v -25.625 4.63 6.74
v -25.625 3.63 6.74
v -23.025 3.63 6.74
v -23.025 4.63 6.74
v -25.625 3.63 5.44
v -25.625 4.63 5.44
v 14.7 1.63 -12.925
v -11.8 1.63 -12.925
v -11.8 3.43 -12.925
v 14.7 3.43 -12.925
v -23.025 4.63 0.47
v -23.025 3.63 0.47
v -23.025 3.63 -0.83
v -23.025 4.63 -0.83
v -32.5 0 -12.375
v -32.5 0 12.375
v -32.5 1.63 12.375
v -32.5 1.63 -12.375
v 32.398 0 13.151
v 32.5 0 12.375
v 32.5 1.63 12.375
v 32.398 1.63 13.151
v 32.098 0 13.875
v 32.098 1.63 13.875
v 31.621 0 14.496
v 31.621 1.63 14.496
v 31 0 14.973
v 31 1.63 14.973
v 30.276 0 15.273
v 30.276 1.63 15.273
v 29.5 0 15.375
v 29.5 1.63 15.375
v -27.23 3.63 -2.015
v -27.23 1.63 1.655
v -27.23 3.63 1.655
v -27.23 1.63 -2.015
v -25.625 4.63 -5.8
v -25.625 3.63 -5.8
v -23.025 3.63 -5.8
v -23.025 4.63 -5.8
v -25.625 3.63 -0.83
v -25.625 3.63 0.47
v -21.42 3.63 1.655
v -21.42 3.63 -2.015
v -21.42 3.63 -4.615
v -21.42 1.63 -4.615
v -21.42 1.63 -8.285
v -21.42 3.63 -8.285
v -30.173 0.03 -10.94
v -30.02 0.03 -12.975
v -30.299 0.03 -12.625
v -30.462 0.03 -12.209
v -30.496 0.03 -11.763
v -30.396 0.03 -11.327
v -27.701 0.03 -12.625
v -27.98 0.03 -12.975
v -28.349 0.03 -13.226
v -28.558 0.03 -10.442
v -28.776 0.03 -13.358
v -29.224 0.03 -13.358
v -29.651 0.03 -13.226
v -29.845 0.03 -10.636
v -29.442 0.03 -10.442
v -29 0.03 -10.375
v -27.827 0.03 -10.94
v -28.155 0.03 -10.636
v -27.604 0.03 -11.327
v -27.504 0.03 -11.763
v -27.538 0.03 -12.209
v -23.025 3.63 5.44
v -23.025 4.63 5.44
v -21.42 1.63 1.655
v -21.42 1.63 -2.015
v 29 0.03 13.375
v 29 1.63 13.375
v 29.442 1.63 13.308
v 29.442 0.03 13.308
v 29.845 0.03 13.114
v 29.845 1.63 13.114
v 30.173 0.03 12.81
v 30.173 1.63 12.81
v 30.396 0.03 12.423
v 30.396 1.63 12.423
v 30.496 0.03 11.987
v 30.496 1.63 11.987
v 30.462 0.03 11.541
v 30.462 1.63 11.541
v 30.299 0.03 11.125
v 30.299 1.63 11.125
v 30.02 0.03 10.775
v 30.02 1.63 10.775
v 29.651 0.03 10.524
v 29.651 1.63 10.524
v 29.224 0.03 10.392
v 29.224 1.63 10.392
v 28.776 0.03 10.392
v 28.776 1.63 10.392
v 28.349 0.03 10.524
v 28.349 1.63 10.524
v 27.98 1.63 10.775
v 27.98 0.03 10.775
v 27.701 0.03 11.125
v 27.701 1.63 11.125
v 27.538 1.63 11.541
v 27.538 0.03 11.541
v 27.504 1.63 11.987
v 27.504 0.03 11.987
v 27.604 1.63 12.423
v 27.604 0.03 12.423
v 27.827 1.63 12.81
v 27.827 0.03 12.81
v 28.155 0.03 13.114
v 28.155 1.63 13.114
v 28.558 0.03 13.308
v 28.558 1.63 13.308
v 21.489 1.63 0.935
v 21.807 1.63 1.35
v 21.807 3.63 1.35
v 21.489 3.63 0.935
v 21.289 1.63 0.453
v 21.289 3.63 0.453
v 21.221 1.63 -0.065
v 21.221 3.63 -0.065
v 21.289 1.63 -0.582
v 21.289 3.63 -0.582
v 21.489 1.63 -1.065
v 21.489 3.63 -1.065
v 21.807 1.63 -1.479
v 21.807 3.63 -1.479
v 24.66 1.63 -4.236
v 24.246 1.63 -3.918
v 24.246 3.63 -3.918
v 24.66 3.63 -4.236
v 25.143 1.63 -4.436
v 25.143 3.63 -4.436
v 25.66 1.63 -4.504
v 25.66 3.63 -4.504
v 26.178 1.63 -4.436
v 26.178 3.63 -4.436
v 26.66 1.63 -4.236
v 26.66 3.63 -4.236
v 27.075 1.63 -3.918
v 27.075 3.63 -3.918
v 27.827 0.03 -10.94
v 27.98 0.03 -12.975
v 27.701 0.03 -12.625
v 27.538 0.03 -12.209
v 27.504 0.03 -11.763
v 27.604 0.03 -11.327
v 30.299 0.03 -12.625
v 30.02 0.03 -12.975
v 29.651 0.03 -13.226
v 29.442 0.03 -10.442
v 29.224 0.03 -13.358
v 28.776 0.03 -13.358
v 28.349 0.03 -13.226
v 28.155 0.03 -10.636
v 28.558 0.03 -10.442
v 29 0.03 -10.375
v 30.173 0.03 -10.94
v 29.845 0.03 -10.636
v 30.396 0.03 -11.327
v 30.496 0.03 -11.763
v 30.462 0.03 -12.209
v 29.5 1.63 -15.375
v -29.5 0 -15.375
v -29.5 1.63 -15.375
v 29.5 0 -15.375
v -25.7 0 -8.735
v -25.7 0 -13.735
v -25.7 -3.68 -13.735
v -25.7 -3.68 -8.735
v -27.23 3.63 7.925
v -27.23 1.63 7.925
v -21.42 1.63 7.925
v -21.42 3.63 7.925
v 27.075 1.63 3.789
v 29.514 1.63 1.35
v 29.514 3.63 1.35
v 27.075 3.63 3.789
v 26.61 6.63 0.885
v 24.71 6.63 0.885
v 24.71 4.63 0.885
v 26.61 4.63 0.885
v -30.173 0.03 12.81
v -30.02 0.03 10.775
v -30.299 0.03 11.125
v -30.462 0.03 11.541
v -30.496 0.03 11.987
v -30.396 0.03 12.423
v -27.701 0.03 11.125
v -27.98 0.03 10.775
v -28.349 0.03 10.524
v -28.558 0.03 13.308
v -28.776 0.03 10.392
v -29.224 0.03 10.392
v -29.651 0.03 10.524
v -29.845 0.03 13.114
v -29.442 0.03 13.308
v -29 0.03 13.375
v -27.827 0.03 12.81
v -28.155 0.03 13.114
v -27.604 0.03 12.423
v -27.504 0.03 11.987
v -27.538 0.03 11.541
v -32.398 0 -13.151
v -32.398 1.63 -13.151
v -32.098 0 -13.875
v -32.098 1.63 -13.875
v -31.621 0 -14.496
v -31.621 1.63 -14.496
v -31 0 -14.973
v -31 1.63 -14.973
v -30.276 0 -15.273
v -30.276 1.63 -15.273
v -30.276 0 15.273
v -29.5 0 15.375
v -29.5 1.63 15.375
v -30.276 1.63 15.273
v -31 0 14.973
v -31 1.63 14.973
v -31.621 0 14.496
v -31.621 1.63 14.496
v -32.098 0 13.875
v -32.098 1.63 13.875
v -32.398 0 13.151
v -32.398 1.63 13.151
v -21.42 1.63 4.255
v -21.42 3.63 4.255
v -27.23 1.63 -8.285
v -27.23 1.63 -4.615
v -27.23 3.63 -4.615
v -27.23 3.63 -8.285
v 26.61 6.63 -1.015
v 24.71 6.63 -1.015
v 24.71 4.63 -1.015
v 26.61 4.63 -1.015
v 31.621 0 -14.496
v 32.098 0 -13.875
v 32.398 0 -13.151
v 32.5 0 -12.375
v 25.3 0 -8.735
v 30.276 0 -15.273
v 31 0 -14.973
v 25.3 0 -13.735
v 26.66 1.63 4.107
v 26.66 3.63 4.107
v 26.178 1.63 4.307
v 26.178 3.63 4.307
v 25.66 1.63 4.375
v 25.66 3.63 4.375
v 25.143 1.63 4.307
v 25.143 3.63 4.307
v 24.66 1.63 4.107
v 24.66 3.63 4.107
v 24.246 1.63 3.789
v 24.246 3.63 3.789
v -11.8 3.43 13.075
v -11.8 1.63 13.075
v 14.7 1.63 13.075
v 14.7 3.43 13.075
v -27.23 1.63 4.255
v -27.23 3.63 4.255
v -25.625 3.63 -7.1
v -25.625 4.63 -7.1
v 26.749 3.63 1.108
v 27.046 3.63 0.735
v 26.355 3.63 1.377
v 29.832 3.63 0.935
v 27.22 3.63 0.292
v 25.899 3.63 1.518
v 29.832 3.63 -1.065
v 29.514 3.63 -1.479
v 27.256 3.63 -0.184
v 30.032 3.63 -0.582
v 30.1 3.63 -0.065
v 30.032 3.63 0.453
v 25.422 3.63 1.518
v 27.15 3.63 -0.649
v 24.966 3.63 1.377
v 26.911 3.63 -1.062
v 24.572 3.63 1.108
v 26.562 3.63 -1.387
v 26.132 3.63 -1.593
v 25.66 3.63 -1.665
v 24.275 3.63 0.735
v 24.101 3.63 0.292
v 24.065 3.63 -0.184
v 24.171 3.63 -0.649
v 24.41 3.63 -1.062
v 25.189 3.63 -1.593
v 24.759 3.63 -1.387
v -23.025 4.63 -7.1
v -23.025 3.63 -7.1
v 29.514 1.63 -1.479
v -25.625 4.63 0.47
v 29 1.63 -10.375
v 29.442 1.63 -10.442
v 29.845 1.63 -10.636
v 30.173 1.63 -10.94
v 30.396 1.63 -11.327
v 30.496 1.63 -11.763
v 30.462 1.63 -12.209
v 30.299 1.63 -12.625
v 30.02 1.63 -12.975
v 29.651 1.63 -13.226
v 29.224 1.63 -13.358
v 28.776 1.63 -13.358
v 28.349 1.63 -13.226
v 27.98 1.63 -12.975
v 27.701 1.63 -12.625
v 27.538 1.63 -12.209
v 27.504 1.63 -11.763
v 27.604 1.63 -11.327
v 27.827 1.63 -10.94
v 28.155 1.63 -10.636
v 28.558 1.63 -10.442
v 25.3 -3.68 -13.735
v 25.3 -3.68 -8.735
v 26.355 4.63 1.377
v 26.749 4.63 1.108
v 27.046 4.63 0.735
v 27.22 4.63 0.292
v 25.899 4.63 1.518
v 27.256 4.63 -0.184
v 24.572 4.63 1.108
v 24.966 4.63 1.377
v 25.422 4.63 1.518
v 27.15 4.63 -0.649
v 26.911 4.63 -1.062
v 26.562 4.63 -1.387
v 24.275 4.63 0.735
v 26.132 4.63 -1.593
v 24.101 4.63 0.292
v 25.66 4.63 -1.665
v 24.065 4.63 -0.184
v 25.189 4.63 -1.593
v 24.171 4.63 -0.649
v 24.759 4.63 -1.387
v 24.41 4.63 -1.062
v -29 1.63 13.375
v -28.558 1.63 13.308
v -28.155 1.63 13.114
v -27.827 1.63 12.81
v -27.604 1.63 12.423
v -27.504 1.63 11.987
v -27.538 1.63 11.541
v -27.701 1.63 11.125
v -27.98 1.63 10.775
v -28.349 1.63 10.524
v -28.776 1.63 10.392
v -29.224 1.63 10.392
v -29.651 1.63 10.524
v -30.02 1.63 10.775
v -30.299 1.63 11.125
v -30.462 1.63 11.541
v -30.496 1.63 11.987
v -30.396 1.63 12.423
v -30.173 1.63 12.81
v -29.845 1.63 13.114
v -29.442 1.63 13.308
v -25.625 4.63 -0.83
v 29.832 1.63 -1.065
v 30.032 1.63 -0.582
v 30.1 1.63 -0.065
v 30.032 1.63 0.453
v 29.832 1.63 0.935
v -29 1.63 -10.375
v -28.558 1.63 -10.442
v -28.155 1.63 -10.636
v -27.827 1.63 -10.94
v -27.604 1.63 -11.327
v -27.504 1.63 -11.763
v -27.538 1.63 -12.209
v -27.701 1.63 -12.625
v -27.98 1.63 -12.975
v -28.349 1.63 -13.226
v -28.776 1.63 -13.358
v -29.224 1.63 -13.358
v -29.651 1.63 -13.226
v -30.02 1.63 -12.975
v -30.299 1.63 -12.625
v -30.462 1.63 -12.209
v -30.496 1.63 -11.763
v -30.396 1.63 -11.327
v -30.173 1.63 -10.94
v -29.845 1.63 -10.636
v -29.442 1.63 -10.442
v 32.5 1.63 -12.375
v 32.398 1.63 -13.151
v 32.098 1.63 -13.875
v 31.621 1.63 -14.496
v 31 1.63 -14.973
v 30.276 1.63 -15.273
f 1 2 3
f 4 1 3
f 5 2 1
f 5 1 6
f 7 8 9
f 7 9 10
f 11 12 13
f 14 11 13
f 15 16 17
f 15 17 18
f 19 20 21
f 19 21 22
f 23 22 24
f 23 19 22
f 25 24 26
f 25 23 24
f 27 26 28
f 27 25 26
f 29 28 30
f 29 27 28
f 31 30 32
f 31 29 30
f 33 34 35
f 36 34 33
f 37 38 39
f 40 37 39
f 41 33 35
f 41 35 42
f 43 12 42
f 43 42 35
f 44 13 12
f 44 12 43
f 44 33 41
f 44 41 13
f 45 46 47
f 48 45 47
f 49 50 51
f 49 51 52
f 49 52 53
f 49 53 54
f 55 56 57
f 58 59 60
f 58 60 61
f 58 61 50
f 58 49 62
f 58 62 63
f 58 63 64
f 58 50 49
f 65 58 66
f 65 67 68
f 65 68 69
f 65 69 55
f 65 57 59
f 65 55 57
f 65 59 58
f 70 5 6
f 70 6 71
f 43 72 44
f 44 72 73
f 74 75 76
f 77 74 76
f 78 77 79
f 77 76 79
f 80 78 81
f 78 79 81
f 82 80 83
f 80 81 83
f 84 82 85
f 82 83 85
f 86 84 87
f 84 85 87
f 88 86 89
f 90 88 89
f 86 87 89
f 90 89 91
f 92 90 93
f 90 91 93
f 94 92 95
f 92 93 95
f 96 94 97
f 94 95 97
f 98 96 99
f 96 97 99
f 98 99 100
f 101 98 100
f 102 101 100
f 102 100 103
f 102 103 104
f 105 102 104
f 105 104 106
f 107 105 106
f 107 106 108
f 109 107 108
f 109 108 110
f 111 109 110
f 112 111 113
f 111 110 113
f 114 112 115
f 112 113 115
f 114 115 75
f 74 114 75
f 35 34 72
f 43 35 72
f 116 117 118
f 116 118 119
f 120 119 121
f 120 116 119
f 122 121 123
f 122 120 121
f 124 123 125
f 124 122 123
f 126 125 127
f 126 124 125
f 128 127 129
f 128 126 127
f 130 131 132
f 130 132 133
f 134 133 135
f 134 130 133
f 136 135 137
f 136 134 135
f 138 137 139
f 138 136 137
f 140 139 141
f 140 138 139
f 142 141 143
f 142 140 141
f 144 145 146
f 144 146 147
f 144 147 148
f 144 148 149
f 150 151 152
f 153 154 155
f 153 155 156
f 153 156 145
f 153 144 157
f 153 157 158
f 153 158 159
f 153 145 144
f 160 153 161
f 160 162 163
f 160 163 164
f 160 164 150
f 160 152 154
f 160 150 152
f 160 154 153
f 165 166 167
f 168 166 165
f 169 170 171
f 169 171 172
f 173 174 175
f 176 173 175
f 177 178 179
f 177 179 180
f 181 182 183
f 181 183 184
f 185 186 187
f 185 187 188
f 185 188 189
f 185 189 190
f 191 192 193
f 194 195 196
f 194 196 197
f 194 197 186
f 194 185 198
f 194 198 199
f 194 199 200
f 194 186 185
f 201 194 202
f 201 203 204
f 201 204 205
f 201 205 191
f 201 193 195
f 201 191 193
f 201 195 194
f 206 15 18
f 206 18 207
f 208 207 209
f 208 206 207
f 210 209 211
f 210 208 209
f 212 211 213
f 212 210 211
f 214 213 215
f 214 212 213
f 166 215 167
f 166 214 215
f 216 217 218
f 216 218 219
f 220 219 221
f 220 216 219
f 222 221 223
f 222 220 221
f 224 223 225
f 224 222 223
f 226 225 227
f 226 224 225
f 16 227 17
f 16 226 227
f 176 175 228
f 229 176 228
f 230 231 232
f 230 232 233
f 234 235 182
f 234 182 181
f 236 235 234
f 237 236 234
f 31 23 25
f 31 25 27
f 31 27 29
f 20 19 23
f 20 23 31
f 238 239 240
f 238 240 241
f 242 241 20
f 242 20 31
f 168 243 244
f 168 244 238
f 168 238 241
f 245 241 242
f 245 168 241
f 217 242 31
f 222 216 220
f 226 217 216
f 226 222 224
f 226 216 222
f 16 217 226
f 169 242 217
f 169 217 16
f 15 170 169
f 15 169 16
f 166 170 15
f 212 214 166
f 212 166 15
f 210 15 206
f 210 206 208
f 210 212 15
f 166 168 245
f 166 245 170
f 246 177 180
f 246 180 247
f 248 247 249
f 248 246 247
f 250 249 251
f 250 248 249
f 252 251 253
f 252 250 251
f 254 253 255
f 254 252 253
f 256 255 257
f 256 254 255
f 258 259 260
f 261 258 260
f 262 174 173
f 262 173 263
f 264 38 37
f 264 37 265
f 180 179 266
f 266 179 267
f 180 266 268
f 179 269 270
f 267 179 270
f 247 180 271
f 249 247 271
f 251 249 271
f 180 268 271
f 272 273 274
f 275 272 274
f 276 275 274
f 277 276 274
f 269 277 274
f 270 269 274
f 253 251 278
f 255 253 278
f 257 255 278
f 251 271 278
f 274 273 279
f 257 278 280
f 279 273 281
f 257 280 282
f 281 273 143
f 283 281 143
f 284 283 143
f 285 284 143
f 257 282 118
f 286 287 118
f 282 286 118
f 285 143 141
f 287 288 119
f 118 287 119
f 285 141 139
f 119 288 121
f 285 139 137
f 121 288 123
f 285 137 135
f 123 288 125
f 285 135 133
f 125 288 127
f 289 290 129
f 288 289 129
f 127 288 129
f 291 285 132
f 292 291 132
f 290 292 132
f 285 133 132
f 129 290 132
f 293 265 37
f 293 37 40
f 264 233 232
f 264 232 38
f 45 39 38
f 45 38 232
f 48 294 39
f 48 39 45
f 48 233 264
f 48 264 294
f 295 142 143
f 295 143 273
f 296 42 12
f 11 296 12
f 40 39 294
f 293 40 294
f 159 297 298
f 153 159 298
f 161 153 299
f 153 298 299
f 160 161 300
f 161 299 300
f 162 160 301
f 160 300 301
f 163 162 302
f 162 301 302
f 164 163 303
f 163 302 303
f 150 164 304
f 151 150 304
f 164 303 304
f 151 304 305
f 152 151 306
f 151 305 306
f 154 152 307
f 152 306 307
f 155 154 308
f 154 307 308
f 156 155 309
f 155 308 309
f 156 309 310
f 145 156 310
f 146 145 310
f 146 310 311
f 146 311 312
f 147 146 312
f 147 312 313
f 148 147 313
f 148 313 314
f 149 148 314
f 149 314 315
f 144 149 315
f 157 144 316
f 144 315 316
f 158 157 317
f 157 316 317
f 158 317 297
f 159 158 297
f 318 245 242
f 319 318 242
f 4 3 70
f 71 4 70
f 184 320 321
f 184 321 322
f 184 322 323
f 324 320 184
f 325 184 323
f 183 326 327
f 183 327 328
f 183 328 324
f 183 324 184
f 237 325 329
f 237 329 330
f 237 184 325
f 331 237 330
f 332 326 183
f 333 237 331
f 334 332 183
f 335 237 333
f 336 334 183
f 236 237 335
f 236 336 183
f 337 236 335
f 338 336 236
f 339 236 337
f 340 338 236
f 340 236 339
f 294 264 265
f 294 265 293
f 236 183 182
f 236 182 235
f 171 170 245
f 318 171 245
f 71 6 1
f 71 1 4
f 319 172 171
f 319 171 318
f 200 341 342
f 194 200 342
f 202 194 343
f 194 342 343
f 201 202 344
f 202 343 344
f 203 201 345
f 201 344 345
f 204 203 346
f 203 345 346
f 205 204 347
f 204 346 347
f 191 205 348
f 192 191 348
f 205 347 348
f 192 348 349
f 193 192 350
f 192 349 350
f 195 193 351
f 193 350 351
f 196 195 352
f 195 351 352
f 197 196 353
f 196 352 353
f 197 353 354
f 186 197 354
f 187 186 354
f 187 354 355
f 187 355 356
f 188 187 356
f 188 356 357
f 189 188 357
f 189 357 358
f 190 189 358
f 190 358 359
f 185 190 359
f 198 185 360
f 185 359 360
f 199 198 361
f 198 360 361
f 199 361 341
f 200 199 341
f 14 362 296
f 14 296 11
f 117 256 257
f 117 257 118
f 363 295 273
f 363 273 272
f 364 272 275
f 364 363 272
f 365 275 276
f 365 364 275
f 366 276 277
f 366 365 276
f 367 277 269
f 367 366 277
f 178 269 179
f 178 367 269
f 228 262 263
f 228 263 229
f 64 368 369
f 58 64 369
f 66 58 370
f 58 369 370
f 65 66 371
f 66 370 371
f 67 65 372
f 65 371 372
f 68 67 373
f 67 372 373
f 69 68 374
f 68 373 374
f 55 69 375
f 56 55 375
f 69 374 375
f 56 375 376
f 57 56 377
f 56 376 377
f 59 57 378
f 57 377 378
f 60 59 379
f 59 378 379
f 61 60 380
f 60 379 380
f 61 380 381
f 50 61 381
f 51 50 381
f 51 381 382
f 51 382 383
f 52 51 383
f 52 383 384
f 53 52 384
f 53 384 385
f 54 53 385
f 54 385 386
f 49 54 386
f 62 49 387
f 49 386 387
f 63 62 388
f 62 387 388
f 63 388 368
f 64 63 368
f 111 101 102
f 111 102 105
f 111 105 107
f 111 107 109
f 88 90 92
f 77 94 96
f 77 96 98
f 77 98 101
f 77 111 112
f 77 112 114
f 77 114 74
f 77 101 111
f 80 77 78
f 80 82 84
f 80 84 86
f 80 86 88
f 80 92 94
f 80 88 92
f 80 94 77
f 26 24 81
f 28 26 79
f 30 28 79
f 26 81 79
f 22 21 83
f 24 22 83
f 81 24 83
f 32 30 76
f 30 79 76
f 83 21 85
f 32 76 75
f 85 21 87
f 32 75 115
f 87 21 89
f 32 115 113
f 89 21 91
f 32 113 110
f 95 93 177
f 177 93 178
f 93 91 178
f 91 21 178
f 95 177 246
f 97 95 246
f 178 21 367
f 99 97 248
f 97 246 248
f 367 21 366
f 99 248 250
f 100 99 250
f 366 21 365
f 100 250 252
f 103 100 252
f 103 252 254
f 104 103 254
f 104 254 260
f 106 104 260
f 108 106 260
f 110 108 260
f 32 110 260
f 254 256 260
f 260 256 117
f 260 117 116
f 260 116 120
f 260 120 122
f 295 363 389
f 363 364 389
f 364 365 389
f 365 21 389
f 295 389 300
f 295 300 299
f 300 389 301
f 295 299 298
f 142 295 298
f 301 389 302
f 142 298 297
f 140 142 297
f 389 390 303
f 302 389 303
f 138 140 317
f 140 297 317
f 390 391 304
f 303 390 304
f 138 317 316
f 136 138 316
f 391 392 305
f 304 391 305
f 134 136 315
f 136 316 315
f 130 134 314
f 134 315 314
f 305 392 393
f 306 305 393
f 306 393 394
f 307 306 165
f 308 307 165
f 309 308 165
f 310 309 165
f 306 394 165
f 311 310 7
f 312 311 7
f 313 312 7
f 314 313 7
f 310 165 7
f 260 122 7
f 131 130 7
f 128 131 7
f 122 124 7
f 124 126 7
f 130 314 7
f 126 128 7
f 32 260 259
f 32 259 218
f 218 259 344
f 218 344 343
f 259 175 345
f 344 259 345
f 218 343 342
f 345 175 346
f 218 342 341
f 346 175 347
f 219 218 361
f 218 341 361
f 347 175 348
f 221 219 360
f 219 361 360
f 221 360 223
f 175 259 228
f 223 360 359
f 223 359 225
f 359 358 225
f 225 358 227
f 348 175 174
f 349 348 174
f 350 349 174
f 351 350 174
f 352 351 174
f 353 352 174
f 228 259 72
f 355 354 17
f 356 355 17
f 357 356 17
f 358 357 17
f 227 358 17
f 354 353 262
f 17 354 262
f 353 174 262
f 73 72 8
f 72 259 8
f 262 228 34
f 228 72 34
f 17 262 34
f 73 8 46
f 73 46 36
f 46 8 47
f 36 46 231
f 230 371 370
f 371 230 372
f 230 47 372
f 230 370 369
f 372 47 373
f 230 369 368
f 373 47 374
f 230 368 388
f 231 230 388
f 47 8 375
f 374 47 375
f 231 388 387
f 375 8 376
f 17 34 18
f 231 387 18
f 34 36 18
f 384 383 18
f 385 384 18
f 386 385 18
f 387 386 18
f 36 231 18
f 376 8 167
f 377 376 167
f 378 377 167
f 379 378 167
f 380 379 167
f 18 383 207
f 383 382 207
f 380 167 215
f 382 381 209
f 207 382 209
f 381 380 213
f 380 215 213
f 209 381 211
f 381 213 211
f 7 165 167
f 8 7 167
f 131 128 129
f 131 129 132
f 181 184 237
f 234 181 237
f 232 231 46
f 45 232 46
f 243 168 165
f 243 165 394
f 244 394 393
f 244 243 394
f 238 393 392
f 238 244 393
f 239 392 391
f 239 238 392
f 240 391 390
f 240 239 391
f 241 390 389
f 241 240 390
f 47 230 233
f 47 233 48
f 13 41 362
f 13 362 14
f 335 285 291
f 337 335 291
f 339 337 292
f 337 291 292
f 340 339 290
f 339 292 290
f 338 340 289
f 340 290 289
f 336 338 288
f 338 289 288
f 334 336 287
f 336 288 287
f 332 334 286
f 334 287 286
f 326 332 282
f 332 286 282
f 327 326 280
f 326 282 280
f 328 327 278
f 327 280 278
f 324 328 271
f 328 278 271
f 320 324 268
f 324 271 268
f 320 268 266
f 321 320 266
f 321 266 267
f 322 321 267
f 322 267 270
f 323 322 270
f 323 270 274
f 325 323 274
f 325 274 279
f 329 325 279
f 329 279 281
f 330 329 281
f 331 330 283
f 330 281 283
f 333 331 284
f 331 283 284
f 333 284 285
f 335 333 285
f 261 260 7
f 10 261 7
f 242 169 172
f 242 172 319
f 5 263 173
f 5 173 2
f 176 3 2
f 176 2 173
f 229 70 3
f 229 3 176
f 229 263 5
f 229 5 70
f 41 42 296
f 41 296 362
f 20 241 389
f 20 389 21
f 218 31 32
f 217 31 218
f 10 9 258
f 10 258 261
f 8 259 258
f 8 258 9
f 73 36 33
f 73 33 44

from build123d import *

# Parameters (mm, degrees)
EXTRUDE_1_DEPTH     = 1.63
SKETCH_2_R          = 1.5
CUT_EXTRUDE_1_DEPTH = 1.6
SKETCH_3_W          = 26.5
SKETCH_3_H          = 26
EXTRUDE_2_DEPTH     = 1.8
EXTRUDE_3_DEPTH     = 2
SKETCH_4_W          = 5.81
SKETCH_4_H          = 3.67
EXTRUDE_4_DEPTH     = 2
SKETCH_7_W          = 2.6
SKETCH_7_H          = 1.3
EXTRUDE_5_DEPTH     = 1
SKETCH_8_W          = 51
SKETCH_8_H          = 5
EXTRUDE_6_DEPTH     = 3.68
SKETCH_9_W          = 1.9
SKETCH_9_H          = 1.9
EXTRUDE_7_DEPTH     = 3
SKETCH_10_R         = 1.6
EXTRUDE_8_DEPTH     = 1


with BuildPart() as part:
    # 草图1 → 凸台-拉伸1 (new body)
    with BuildSketch(Plane(origin=(0, 0, 0), x_dir=(1, 0, 0), z_dir=(0, 1, 0))):
        with BuildLine():
            Line((-29.5, 15.375), (29.5, 15.375))
            ThreePointArc((29.5, 15.375), (31.621320344, 14.496320344), (32.5, 12.375))
            Line((32.5, 12.375), (32.5, -12.375))
            ThreePointArc((32.5, -12.375), (31.621320344, -14.496320344), (29.5, -15.375))
            Line((29.5, -15.375), (-29.5, -15.375))
            ThreePointArc((-29.5, -15.375), (-31.621320344, -14.496320344), (-32.5, -12.375))
            Line((-32.5, -12.375), (-32.5, 12.375))
            ThreePointArc((-32.5, 12.375), (-31.621320344, 14.496320344), (-29.5, 15.375))
        make_face()
    extrude(amount=EXTRUDE_1_DEPTH)

    # 草图2 → 切除-拉伸1 (cut)
    with BuildSketch(Plane(origin=(0, 1.63, 0), x_dir=(1, 0, 0), z_dir=(0, 1, 0))):
        with Locations(Location((-29, 11.875, 0), (0, 0, 270))):
            Circle(SKETCH_2_R)
        with Locations(Location((-29, -11.875, 0), (0, 0, 270))):
            Circle(SKETCH_2_R)
        with Locations(Location((29, -11.875, 0), (0, 0, 270))):
            Circle(SKETCH_2_R)
        with Locations(Location((29, 11.875, 0), (0, 0, 270))):
            Circle(SKETCH_2_R)
    extrude(amount=-CUT_EXTRUDE_1_DEPTH, mode=Mode.SUBTRACT)

    # 草图3 → 凸台-拉伸2 (add)
    with BuildSketch(Plane(origin=(0, 1.63, 0), x_dir=(1, 0, 0), z_dir=(0, 1, 0))):
        with Locations((1.45, -0.075)):
            Rectangle(SKETCH_3_W, SKETCH_3_H)
    extrude(amount=EXTRUDE_2_DEPTH)

    # 草图5 → 凸台-拉伸3 (add)
    with BuildSketch(Plane(origin=(0, 1.63, 0), x_dir=(1, 0, 0), z_dir=(0, 1, 0))):
        with BuildLine():
            Line((27.074695167, 3.918250353), (29.514213562, 1.478731957))
            ThreePointArc((29.514213562, 1.478731957), (30.1, 0.064518395), (29.514213562, -1.349695167))
            Line((29.514213562, -1.349695167), (27.074695167, -3.789213562))
            ThreePointArc((27.074695167, -3.789213562), (25.660481605, -4.375), (24.246268043, -3.789213562))
            Line((24.246268043, -3.789213562), (21.806749647, -1.349695167))
            ThreePointArc((21.806749647, -1.349695167), (21.22096321, 0.064518395), (21.806749647, 1.478731957))
            Line((21.806749647, 1.478731957), (24.246268043, 3.918250353))
            ThreePointArc((24.246268043, 3.918250353), (25.660481605, 4.50403679), (27.074695167, 3.918250353))
        make_face()
    extrude(amount=EXTRUDE_3_DEPTH)

    # 草图4 → 凸台-拉伸4 (add)
    with BuildSketch(Plane(origin=(0, 1.63, 0), x_dir=(1, 0, 0), z_dir=(0, 1, 0))):
        with Locations((-24.325, 6.45)):
            Rectangle(SKETCH_4_W, SKETCH_4_H)
        with Locations((-24.325, 0.18)):
            Rectangle(SKETCH_4_W, SKETCH_4_H)
        with Locations((-24.325, -6.09)):
            Rectangle(SKETCH_4_W, SKETCH_4_H)
    extrude(amount=EXTRUDE_4_DEPTH)

    # 草图7 → 凸台-拉伸5 (add)
    with BuildSketch(Plane(origin=(0, 3.63, 0), x_dir=(1, 0, 0), z_dir=(0, 1, 0))):
        with Locations((-24.325, 6.45)):
            Rectangle(SKETCH_7_W, SKETCH_7_H)
        with Locations((-24.325, 0.18)):
            Rectangle(SKETCH_7_W, SKETCH_7_H)
        with Locations((-24.325, -6.09)):
            Rectangle(SKETCH_7_W, SKETCH_7_H)
    extrude(amount=EXTRUDE_5_DEPTH)

    # 草图8 → 凸台-拉伸6 (add)
    with BuildSketch(Plane.XZ):
        with Locations((-0.2, -11.235)):
            Rectangle(SKETCH_8_W, SKETCH_8_H)
    extrude(amount=EXTRUDE_6_DEPTH)

    # 草图9 → 凸台-拉伸7 (add)
    with BuildSketch(Plane(origin=(0, 3.63, 0), x_dir=(1, 0, 0), z_dir=(0, 1, 0))):
        with Locations((25.660481605, 0.064518395)):
            Rectangle(SKETCH_9_W, SKETCH_9_H)
    extrude(amount=EXTRUDE_7_DEPTH)

    # 草图10 → 凸台-拉伸8 (add)
    with BuildSketch(Plane(origin=(0, 3.63, 0), x_dir=(1, 0, 0), z_dir=(0, 1, 0))):
        with Locations(Location((25.660481605, 0.064518395, 0), (0, 0, 90))):
            Circle(SKETCH_10_R)
    extrude(amount=EXTRUDE_8_DEPTH)


solid = part.part
